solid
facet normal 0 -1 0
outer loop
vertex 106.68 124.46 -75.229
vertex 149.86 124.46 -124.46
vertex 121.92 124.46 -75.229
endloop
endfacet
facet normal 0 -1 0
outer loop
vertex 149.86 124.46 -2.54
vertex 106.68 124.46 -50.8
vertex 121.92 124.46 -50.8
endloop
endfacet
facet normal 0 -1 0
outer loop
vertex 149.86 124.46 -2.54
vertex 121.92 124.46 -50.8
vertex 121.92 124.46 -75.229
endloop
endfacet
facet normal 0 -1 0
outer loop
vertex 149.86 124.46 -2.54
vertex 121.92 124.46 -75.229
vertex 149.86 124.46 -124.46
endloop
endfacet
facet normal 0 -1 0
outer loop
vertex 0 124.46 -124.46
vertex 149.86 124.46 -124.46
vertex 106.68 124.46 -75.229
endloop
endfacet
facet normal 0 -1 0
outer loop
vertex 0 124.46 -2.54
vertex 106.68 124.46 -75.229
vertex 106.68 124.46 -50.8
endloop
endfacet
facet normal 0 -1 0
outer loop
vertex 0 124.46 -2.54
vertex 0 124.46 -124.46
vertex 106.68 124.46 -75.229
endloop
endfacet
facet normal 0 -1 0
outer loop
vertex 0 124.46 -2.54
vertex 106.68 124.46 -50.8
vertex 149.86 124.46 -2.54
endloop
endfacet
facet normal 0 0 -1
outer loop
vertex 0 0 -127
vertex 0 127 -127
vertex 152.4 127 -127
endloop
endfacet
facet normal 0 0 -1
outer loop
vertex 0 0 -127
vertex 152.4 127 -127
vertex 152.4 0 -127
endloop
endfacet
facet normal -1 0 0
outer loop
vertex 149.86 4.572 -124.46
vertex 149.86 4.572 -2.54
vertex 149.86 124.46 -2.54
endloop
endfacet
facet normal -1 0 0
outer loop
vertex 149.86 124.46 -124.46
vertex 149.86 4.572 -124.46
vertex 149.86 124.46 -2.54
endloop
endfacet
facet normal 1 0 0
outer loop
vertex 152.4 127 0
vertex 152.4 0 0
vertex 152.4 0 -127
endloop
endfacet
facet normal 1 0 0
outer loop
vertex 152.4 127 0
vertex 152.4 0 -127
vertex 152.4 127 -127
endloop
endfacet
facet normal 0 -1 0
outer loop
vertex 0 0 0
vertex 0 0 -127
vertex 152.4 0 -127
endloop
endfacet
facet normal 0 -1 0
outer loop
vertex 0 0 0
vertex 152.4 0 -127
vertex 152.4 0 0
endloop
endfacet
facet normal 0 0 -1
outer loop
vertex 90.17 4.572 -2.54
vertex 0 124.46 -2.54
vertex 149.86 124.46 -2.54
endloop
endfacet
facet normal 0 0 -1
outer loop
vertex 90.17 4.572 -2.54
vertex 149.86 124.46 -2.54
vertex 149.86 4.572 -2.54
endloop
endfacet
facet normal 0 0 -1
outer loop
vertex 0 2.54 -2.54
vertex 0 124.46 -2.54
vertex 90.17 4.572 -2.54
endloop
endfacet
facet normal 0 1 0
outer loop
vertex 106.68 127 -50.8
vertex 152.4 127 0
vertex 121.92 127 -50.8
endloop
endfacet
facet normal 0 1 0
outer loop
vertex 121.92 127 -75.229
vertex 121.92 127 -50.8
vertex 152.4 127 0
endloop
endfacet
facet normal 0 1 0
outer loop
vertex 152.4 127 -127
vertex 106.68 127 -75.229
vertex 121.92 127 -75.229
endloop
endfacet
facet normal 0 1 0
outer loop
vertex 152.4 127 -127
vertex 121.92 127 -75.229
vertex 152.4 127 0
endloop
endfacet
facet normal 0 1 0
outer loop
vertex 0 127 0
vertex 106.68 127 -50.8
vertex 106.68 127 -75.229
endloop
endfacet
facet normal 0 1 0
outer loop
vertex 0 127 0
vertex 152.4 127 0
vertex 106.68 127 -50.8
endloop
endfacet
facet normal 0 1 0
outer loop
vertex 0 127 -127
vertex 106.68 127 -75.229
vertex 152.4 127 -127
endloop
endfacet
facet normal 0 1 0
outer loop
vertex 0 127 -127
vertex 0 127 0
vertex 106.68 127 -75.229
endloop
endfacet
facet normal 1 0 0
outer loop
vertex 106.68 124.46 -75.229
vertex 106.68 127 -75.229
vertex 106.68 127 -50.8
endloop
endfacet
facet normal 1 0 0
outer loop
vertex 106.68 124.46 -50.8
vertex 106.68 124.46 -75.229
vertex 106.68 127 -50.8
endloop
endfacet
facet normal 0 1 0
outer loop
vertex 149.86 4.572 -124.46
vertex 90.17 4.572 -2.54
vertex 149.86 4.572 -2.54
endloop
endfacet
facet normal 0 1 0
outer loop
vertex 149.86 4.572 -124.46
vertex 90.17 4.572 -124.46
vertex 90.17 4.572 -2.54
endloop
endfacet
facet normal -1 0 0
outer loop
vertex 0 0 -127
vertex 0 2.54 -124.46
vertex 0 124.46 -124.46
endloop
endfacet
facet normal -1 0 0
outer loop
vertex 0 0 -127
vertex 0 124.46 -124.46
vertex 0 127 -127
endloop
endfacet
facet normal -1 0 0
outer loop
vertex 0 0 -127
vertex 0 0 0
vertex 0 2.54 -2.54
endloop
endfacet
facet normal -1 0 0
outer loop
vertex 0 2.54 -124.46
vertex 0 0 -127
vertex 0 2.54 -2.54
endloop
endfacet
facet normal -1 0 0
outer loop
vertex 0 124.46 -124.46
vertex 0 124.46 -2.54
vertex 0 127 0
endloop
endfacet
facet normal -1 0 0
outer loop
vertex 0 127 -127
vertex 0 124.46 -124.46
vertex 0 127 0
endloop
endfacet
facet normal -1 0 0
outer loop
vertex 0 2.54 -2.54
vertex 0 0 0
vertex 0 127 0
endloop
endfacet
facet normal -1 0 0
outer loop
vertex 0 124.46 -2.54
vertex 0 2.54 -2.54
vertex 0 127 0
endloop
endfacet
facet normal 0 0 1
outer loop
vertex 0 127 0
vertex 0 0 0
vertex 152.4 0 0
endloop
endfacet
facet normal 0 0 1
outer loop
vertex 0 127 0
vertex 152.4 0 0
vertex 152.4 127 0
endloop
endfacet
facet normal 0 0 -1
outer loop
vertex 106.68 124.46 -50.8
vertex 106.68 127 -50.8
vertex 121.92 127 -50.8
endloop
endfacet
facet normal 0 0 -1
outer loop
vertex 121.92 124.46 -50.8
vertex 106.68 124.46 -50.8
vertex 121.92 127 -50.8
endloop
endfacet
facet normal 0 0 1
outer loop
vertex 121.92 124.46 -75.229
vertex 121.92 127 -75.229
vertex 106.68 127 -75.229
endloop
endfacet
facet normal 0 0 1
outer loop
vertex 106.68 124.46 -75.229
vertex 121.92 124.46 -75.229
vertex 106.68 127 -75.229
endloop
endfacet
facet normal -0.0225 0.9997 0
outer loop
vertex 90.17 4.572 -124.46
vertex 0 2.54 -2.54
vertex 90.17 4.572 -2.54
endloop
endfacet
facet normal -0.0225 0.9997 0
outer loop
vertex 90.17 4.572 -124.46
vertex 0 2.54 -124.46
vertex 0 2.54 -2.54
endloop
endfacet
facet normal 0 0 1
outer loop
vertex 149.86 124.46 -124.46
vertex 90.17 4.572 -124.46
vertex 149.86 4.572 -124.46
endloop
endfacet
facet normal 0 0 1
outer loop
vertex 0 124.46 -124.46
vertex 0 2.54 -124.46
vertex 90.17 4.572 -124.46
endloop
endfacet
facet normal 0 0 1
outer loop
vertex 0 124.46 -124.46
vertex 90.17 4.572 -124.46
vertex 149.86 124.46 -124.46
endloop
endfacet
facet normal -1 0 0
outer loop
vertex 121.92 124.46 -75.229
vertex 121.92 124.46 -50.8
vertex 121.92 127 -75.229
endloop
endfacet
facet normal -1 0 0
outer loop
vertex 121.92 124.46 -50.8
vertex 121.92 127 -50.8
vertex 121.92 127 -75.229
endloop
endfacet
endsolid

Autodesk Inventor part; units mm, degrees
ref_plane "YZ Plane" through (0, 0, 0) normal (1, 0, 0) x (0, 1, 0)
ref_plane "XZ Plane" through (0, 0, 0) normal (0, 1, 0) x (-1, 0, 0)
ref_plane "XY Plane" through (0, 0, 0) normal (0, 0, 1) x (1, 0, 0)
sketch "Sketch1" plane through (0, 0, 0) normal (1, 0, 0) x (0, 1, 0)
  line L0 (0, 0) -> (127, 0)
  line L1 (127, 0) -> (127, -127)
  line L2 (127, -127) -> (0, -127)
  line L3 (0, -127) -> (0, 0)
  line L4 (127, -127) -> (124.46, -127)
  line L5 (124.46, -127) -> (124.46, -124.46)
  line L6 (124.46, -124.46) -> (127, -124.46)
  line L7 (127, -124.46) -> (127, -127)
  line L8 (127, 0) -> (124.46, 0)
  line L9 (124.46, 0) -> (124.46, -2.54)
  line L10 (124.46, -2.54) -> (127, -2.54)
  line L11 (127, -2.54) -> (127, 0)
  line L12 (124.46, -2.54) -> (2.54, -2.54)
  line L13 (2.54, -2.54) -> (2.54, -124.46)
  line L14 (2.54, -124.46) -> (124.46, -124.46)
  line L15 (124.46, -124.46) -> (124.46, -2.54)
  line L16 (124.46, -124.46) -> (122.682, -124.46)
  line L17 (124.46, -2.54) -> (68.58, -2.54)
  line L18 (124.46, -4.572) -> (124.46, -2.54)
  line L19 (0, 0) -> (50.8, 0)
  line L20 (0, -25.4) -> (0, 0)
  line L21 (127, 0) -> (76.2, 0)
  line L22 (127, -25.4) -> (127, 0)
extrude "Extrusion1" add sketch "Sketch1" along normal blind 152.4
extrude "Extrusion2" cut sketch "Sketch1" along normal blind 149.86 contours L15 L14 L13 L12
sketch "Sketch10" plane through (0, 2.54, -124.46) normal (0, 0, 1) x (1, 0, 0)
  line L0 (0, 0) -> (149.86, 0) projected
  line L1 (149.86, 0) -> (90.17, 0)
  line L2 (90.17, 0) -> (90.17, 2.032)
  line L3 (90.17, 2.032) -> (149.86, 2.032)
  line L4 (149.86, 2.032) -> (149.86, 0)
  line L5 (0, 0) -> (90.17, 2.032)
  point P0 (0, -2.54)
  dimension "d22" = 59.69
  dimension "d23" = 2.032
extrude "Extrusion5" add sketch "Sketch10" along normal blind 121.92
sketch "Sketch11" plane through (0, 127, 0) normal (0, 1, 0) x (1, 0, 0)
  line L0 (0, 0) -> (152.4, 0) projected
  line L1 (152.4, 0) -> (121.92, 0)
  line L2 (121.92, 0) -> (121.92, 50.8)
  line L3 (121.92, 50.8) -> (152.4, 50.8)
  line L4 (152.4, 50.8) -> (152.4, 0)
  line L5 (152.4, 126.0289) -> (121.92, 126.0289)
  line L6 (121.92, 126.0289) -> (121.92, 75.2289)
  line L7 (121.92, 75.2289) -> (152.4, 75.2289)
  line L8 (152.4, 75.2289) -> (152.4, 126.0289)
  line L9 (121.92, 75.2289) -> (106.68, 75.2289)
  line L10 (106.68, 75.2289) -> (106.68, 50.8)
  line L11 (106.68, 50.8) -> (121.92, 50.8)
  line L12 (121.92, 50.8) -> (121.92, 75.2289)
  dimension "d30" = 30.48
  dimension "d31" = 50.8
  dimension "d32" = 30.48
  dimension "d33" = 50.8
  dimension "d34" = 15.24
extrude "Extrusion6" cut sketch "Sketch11" against normal blind 2.54 contours L11 L10 L9 L12
properties part number "box-1"
